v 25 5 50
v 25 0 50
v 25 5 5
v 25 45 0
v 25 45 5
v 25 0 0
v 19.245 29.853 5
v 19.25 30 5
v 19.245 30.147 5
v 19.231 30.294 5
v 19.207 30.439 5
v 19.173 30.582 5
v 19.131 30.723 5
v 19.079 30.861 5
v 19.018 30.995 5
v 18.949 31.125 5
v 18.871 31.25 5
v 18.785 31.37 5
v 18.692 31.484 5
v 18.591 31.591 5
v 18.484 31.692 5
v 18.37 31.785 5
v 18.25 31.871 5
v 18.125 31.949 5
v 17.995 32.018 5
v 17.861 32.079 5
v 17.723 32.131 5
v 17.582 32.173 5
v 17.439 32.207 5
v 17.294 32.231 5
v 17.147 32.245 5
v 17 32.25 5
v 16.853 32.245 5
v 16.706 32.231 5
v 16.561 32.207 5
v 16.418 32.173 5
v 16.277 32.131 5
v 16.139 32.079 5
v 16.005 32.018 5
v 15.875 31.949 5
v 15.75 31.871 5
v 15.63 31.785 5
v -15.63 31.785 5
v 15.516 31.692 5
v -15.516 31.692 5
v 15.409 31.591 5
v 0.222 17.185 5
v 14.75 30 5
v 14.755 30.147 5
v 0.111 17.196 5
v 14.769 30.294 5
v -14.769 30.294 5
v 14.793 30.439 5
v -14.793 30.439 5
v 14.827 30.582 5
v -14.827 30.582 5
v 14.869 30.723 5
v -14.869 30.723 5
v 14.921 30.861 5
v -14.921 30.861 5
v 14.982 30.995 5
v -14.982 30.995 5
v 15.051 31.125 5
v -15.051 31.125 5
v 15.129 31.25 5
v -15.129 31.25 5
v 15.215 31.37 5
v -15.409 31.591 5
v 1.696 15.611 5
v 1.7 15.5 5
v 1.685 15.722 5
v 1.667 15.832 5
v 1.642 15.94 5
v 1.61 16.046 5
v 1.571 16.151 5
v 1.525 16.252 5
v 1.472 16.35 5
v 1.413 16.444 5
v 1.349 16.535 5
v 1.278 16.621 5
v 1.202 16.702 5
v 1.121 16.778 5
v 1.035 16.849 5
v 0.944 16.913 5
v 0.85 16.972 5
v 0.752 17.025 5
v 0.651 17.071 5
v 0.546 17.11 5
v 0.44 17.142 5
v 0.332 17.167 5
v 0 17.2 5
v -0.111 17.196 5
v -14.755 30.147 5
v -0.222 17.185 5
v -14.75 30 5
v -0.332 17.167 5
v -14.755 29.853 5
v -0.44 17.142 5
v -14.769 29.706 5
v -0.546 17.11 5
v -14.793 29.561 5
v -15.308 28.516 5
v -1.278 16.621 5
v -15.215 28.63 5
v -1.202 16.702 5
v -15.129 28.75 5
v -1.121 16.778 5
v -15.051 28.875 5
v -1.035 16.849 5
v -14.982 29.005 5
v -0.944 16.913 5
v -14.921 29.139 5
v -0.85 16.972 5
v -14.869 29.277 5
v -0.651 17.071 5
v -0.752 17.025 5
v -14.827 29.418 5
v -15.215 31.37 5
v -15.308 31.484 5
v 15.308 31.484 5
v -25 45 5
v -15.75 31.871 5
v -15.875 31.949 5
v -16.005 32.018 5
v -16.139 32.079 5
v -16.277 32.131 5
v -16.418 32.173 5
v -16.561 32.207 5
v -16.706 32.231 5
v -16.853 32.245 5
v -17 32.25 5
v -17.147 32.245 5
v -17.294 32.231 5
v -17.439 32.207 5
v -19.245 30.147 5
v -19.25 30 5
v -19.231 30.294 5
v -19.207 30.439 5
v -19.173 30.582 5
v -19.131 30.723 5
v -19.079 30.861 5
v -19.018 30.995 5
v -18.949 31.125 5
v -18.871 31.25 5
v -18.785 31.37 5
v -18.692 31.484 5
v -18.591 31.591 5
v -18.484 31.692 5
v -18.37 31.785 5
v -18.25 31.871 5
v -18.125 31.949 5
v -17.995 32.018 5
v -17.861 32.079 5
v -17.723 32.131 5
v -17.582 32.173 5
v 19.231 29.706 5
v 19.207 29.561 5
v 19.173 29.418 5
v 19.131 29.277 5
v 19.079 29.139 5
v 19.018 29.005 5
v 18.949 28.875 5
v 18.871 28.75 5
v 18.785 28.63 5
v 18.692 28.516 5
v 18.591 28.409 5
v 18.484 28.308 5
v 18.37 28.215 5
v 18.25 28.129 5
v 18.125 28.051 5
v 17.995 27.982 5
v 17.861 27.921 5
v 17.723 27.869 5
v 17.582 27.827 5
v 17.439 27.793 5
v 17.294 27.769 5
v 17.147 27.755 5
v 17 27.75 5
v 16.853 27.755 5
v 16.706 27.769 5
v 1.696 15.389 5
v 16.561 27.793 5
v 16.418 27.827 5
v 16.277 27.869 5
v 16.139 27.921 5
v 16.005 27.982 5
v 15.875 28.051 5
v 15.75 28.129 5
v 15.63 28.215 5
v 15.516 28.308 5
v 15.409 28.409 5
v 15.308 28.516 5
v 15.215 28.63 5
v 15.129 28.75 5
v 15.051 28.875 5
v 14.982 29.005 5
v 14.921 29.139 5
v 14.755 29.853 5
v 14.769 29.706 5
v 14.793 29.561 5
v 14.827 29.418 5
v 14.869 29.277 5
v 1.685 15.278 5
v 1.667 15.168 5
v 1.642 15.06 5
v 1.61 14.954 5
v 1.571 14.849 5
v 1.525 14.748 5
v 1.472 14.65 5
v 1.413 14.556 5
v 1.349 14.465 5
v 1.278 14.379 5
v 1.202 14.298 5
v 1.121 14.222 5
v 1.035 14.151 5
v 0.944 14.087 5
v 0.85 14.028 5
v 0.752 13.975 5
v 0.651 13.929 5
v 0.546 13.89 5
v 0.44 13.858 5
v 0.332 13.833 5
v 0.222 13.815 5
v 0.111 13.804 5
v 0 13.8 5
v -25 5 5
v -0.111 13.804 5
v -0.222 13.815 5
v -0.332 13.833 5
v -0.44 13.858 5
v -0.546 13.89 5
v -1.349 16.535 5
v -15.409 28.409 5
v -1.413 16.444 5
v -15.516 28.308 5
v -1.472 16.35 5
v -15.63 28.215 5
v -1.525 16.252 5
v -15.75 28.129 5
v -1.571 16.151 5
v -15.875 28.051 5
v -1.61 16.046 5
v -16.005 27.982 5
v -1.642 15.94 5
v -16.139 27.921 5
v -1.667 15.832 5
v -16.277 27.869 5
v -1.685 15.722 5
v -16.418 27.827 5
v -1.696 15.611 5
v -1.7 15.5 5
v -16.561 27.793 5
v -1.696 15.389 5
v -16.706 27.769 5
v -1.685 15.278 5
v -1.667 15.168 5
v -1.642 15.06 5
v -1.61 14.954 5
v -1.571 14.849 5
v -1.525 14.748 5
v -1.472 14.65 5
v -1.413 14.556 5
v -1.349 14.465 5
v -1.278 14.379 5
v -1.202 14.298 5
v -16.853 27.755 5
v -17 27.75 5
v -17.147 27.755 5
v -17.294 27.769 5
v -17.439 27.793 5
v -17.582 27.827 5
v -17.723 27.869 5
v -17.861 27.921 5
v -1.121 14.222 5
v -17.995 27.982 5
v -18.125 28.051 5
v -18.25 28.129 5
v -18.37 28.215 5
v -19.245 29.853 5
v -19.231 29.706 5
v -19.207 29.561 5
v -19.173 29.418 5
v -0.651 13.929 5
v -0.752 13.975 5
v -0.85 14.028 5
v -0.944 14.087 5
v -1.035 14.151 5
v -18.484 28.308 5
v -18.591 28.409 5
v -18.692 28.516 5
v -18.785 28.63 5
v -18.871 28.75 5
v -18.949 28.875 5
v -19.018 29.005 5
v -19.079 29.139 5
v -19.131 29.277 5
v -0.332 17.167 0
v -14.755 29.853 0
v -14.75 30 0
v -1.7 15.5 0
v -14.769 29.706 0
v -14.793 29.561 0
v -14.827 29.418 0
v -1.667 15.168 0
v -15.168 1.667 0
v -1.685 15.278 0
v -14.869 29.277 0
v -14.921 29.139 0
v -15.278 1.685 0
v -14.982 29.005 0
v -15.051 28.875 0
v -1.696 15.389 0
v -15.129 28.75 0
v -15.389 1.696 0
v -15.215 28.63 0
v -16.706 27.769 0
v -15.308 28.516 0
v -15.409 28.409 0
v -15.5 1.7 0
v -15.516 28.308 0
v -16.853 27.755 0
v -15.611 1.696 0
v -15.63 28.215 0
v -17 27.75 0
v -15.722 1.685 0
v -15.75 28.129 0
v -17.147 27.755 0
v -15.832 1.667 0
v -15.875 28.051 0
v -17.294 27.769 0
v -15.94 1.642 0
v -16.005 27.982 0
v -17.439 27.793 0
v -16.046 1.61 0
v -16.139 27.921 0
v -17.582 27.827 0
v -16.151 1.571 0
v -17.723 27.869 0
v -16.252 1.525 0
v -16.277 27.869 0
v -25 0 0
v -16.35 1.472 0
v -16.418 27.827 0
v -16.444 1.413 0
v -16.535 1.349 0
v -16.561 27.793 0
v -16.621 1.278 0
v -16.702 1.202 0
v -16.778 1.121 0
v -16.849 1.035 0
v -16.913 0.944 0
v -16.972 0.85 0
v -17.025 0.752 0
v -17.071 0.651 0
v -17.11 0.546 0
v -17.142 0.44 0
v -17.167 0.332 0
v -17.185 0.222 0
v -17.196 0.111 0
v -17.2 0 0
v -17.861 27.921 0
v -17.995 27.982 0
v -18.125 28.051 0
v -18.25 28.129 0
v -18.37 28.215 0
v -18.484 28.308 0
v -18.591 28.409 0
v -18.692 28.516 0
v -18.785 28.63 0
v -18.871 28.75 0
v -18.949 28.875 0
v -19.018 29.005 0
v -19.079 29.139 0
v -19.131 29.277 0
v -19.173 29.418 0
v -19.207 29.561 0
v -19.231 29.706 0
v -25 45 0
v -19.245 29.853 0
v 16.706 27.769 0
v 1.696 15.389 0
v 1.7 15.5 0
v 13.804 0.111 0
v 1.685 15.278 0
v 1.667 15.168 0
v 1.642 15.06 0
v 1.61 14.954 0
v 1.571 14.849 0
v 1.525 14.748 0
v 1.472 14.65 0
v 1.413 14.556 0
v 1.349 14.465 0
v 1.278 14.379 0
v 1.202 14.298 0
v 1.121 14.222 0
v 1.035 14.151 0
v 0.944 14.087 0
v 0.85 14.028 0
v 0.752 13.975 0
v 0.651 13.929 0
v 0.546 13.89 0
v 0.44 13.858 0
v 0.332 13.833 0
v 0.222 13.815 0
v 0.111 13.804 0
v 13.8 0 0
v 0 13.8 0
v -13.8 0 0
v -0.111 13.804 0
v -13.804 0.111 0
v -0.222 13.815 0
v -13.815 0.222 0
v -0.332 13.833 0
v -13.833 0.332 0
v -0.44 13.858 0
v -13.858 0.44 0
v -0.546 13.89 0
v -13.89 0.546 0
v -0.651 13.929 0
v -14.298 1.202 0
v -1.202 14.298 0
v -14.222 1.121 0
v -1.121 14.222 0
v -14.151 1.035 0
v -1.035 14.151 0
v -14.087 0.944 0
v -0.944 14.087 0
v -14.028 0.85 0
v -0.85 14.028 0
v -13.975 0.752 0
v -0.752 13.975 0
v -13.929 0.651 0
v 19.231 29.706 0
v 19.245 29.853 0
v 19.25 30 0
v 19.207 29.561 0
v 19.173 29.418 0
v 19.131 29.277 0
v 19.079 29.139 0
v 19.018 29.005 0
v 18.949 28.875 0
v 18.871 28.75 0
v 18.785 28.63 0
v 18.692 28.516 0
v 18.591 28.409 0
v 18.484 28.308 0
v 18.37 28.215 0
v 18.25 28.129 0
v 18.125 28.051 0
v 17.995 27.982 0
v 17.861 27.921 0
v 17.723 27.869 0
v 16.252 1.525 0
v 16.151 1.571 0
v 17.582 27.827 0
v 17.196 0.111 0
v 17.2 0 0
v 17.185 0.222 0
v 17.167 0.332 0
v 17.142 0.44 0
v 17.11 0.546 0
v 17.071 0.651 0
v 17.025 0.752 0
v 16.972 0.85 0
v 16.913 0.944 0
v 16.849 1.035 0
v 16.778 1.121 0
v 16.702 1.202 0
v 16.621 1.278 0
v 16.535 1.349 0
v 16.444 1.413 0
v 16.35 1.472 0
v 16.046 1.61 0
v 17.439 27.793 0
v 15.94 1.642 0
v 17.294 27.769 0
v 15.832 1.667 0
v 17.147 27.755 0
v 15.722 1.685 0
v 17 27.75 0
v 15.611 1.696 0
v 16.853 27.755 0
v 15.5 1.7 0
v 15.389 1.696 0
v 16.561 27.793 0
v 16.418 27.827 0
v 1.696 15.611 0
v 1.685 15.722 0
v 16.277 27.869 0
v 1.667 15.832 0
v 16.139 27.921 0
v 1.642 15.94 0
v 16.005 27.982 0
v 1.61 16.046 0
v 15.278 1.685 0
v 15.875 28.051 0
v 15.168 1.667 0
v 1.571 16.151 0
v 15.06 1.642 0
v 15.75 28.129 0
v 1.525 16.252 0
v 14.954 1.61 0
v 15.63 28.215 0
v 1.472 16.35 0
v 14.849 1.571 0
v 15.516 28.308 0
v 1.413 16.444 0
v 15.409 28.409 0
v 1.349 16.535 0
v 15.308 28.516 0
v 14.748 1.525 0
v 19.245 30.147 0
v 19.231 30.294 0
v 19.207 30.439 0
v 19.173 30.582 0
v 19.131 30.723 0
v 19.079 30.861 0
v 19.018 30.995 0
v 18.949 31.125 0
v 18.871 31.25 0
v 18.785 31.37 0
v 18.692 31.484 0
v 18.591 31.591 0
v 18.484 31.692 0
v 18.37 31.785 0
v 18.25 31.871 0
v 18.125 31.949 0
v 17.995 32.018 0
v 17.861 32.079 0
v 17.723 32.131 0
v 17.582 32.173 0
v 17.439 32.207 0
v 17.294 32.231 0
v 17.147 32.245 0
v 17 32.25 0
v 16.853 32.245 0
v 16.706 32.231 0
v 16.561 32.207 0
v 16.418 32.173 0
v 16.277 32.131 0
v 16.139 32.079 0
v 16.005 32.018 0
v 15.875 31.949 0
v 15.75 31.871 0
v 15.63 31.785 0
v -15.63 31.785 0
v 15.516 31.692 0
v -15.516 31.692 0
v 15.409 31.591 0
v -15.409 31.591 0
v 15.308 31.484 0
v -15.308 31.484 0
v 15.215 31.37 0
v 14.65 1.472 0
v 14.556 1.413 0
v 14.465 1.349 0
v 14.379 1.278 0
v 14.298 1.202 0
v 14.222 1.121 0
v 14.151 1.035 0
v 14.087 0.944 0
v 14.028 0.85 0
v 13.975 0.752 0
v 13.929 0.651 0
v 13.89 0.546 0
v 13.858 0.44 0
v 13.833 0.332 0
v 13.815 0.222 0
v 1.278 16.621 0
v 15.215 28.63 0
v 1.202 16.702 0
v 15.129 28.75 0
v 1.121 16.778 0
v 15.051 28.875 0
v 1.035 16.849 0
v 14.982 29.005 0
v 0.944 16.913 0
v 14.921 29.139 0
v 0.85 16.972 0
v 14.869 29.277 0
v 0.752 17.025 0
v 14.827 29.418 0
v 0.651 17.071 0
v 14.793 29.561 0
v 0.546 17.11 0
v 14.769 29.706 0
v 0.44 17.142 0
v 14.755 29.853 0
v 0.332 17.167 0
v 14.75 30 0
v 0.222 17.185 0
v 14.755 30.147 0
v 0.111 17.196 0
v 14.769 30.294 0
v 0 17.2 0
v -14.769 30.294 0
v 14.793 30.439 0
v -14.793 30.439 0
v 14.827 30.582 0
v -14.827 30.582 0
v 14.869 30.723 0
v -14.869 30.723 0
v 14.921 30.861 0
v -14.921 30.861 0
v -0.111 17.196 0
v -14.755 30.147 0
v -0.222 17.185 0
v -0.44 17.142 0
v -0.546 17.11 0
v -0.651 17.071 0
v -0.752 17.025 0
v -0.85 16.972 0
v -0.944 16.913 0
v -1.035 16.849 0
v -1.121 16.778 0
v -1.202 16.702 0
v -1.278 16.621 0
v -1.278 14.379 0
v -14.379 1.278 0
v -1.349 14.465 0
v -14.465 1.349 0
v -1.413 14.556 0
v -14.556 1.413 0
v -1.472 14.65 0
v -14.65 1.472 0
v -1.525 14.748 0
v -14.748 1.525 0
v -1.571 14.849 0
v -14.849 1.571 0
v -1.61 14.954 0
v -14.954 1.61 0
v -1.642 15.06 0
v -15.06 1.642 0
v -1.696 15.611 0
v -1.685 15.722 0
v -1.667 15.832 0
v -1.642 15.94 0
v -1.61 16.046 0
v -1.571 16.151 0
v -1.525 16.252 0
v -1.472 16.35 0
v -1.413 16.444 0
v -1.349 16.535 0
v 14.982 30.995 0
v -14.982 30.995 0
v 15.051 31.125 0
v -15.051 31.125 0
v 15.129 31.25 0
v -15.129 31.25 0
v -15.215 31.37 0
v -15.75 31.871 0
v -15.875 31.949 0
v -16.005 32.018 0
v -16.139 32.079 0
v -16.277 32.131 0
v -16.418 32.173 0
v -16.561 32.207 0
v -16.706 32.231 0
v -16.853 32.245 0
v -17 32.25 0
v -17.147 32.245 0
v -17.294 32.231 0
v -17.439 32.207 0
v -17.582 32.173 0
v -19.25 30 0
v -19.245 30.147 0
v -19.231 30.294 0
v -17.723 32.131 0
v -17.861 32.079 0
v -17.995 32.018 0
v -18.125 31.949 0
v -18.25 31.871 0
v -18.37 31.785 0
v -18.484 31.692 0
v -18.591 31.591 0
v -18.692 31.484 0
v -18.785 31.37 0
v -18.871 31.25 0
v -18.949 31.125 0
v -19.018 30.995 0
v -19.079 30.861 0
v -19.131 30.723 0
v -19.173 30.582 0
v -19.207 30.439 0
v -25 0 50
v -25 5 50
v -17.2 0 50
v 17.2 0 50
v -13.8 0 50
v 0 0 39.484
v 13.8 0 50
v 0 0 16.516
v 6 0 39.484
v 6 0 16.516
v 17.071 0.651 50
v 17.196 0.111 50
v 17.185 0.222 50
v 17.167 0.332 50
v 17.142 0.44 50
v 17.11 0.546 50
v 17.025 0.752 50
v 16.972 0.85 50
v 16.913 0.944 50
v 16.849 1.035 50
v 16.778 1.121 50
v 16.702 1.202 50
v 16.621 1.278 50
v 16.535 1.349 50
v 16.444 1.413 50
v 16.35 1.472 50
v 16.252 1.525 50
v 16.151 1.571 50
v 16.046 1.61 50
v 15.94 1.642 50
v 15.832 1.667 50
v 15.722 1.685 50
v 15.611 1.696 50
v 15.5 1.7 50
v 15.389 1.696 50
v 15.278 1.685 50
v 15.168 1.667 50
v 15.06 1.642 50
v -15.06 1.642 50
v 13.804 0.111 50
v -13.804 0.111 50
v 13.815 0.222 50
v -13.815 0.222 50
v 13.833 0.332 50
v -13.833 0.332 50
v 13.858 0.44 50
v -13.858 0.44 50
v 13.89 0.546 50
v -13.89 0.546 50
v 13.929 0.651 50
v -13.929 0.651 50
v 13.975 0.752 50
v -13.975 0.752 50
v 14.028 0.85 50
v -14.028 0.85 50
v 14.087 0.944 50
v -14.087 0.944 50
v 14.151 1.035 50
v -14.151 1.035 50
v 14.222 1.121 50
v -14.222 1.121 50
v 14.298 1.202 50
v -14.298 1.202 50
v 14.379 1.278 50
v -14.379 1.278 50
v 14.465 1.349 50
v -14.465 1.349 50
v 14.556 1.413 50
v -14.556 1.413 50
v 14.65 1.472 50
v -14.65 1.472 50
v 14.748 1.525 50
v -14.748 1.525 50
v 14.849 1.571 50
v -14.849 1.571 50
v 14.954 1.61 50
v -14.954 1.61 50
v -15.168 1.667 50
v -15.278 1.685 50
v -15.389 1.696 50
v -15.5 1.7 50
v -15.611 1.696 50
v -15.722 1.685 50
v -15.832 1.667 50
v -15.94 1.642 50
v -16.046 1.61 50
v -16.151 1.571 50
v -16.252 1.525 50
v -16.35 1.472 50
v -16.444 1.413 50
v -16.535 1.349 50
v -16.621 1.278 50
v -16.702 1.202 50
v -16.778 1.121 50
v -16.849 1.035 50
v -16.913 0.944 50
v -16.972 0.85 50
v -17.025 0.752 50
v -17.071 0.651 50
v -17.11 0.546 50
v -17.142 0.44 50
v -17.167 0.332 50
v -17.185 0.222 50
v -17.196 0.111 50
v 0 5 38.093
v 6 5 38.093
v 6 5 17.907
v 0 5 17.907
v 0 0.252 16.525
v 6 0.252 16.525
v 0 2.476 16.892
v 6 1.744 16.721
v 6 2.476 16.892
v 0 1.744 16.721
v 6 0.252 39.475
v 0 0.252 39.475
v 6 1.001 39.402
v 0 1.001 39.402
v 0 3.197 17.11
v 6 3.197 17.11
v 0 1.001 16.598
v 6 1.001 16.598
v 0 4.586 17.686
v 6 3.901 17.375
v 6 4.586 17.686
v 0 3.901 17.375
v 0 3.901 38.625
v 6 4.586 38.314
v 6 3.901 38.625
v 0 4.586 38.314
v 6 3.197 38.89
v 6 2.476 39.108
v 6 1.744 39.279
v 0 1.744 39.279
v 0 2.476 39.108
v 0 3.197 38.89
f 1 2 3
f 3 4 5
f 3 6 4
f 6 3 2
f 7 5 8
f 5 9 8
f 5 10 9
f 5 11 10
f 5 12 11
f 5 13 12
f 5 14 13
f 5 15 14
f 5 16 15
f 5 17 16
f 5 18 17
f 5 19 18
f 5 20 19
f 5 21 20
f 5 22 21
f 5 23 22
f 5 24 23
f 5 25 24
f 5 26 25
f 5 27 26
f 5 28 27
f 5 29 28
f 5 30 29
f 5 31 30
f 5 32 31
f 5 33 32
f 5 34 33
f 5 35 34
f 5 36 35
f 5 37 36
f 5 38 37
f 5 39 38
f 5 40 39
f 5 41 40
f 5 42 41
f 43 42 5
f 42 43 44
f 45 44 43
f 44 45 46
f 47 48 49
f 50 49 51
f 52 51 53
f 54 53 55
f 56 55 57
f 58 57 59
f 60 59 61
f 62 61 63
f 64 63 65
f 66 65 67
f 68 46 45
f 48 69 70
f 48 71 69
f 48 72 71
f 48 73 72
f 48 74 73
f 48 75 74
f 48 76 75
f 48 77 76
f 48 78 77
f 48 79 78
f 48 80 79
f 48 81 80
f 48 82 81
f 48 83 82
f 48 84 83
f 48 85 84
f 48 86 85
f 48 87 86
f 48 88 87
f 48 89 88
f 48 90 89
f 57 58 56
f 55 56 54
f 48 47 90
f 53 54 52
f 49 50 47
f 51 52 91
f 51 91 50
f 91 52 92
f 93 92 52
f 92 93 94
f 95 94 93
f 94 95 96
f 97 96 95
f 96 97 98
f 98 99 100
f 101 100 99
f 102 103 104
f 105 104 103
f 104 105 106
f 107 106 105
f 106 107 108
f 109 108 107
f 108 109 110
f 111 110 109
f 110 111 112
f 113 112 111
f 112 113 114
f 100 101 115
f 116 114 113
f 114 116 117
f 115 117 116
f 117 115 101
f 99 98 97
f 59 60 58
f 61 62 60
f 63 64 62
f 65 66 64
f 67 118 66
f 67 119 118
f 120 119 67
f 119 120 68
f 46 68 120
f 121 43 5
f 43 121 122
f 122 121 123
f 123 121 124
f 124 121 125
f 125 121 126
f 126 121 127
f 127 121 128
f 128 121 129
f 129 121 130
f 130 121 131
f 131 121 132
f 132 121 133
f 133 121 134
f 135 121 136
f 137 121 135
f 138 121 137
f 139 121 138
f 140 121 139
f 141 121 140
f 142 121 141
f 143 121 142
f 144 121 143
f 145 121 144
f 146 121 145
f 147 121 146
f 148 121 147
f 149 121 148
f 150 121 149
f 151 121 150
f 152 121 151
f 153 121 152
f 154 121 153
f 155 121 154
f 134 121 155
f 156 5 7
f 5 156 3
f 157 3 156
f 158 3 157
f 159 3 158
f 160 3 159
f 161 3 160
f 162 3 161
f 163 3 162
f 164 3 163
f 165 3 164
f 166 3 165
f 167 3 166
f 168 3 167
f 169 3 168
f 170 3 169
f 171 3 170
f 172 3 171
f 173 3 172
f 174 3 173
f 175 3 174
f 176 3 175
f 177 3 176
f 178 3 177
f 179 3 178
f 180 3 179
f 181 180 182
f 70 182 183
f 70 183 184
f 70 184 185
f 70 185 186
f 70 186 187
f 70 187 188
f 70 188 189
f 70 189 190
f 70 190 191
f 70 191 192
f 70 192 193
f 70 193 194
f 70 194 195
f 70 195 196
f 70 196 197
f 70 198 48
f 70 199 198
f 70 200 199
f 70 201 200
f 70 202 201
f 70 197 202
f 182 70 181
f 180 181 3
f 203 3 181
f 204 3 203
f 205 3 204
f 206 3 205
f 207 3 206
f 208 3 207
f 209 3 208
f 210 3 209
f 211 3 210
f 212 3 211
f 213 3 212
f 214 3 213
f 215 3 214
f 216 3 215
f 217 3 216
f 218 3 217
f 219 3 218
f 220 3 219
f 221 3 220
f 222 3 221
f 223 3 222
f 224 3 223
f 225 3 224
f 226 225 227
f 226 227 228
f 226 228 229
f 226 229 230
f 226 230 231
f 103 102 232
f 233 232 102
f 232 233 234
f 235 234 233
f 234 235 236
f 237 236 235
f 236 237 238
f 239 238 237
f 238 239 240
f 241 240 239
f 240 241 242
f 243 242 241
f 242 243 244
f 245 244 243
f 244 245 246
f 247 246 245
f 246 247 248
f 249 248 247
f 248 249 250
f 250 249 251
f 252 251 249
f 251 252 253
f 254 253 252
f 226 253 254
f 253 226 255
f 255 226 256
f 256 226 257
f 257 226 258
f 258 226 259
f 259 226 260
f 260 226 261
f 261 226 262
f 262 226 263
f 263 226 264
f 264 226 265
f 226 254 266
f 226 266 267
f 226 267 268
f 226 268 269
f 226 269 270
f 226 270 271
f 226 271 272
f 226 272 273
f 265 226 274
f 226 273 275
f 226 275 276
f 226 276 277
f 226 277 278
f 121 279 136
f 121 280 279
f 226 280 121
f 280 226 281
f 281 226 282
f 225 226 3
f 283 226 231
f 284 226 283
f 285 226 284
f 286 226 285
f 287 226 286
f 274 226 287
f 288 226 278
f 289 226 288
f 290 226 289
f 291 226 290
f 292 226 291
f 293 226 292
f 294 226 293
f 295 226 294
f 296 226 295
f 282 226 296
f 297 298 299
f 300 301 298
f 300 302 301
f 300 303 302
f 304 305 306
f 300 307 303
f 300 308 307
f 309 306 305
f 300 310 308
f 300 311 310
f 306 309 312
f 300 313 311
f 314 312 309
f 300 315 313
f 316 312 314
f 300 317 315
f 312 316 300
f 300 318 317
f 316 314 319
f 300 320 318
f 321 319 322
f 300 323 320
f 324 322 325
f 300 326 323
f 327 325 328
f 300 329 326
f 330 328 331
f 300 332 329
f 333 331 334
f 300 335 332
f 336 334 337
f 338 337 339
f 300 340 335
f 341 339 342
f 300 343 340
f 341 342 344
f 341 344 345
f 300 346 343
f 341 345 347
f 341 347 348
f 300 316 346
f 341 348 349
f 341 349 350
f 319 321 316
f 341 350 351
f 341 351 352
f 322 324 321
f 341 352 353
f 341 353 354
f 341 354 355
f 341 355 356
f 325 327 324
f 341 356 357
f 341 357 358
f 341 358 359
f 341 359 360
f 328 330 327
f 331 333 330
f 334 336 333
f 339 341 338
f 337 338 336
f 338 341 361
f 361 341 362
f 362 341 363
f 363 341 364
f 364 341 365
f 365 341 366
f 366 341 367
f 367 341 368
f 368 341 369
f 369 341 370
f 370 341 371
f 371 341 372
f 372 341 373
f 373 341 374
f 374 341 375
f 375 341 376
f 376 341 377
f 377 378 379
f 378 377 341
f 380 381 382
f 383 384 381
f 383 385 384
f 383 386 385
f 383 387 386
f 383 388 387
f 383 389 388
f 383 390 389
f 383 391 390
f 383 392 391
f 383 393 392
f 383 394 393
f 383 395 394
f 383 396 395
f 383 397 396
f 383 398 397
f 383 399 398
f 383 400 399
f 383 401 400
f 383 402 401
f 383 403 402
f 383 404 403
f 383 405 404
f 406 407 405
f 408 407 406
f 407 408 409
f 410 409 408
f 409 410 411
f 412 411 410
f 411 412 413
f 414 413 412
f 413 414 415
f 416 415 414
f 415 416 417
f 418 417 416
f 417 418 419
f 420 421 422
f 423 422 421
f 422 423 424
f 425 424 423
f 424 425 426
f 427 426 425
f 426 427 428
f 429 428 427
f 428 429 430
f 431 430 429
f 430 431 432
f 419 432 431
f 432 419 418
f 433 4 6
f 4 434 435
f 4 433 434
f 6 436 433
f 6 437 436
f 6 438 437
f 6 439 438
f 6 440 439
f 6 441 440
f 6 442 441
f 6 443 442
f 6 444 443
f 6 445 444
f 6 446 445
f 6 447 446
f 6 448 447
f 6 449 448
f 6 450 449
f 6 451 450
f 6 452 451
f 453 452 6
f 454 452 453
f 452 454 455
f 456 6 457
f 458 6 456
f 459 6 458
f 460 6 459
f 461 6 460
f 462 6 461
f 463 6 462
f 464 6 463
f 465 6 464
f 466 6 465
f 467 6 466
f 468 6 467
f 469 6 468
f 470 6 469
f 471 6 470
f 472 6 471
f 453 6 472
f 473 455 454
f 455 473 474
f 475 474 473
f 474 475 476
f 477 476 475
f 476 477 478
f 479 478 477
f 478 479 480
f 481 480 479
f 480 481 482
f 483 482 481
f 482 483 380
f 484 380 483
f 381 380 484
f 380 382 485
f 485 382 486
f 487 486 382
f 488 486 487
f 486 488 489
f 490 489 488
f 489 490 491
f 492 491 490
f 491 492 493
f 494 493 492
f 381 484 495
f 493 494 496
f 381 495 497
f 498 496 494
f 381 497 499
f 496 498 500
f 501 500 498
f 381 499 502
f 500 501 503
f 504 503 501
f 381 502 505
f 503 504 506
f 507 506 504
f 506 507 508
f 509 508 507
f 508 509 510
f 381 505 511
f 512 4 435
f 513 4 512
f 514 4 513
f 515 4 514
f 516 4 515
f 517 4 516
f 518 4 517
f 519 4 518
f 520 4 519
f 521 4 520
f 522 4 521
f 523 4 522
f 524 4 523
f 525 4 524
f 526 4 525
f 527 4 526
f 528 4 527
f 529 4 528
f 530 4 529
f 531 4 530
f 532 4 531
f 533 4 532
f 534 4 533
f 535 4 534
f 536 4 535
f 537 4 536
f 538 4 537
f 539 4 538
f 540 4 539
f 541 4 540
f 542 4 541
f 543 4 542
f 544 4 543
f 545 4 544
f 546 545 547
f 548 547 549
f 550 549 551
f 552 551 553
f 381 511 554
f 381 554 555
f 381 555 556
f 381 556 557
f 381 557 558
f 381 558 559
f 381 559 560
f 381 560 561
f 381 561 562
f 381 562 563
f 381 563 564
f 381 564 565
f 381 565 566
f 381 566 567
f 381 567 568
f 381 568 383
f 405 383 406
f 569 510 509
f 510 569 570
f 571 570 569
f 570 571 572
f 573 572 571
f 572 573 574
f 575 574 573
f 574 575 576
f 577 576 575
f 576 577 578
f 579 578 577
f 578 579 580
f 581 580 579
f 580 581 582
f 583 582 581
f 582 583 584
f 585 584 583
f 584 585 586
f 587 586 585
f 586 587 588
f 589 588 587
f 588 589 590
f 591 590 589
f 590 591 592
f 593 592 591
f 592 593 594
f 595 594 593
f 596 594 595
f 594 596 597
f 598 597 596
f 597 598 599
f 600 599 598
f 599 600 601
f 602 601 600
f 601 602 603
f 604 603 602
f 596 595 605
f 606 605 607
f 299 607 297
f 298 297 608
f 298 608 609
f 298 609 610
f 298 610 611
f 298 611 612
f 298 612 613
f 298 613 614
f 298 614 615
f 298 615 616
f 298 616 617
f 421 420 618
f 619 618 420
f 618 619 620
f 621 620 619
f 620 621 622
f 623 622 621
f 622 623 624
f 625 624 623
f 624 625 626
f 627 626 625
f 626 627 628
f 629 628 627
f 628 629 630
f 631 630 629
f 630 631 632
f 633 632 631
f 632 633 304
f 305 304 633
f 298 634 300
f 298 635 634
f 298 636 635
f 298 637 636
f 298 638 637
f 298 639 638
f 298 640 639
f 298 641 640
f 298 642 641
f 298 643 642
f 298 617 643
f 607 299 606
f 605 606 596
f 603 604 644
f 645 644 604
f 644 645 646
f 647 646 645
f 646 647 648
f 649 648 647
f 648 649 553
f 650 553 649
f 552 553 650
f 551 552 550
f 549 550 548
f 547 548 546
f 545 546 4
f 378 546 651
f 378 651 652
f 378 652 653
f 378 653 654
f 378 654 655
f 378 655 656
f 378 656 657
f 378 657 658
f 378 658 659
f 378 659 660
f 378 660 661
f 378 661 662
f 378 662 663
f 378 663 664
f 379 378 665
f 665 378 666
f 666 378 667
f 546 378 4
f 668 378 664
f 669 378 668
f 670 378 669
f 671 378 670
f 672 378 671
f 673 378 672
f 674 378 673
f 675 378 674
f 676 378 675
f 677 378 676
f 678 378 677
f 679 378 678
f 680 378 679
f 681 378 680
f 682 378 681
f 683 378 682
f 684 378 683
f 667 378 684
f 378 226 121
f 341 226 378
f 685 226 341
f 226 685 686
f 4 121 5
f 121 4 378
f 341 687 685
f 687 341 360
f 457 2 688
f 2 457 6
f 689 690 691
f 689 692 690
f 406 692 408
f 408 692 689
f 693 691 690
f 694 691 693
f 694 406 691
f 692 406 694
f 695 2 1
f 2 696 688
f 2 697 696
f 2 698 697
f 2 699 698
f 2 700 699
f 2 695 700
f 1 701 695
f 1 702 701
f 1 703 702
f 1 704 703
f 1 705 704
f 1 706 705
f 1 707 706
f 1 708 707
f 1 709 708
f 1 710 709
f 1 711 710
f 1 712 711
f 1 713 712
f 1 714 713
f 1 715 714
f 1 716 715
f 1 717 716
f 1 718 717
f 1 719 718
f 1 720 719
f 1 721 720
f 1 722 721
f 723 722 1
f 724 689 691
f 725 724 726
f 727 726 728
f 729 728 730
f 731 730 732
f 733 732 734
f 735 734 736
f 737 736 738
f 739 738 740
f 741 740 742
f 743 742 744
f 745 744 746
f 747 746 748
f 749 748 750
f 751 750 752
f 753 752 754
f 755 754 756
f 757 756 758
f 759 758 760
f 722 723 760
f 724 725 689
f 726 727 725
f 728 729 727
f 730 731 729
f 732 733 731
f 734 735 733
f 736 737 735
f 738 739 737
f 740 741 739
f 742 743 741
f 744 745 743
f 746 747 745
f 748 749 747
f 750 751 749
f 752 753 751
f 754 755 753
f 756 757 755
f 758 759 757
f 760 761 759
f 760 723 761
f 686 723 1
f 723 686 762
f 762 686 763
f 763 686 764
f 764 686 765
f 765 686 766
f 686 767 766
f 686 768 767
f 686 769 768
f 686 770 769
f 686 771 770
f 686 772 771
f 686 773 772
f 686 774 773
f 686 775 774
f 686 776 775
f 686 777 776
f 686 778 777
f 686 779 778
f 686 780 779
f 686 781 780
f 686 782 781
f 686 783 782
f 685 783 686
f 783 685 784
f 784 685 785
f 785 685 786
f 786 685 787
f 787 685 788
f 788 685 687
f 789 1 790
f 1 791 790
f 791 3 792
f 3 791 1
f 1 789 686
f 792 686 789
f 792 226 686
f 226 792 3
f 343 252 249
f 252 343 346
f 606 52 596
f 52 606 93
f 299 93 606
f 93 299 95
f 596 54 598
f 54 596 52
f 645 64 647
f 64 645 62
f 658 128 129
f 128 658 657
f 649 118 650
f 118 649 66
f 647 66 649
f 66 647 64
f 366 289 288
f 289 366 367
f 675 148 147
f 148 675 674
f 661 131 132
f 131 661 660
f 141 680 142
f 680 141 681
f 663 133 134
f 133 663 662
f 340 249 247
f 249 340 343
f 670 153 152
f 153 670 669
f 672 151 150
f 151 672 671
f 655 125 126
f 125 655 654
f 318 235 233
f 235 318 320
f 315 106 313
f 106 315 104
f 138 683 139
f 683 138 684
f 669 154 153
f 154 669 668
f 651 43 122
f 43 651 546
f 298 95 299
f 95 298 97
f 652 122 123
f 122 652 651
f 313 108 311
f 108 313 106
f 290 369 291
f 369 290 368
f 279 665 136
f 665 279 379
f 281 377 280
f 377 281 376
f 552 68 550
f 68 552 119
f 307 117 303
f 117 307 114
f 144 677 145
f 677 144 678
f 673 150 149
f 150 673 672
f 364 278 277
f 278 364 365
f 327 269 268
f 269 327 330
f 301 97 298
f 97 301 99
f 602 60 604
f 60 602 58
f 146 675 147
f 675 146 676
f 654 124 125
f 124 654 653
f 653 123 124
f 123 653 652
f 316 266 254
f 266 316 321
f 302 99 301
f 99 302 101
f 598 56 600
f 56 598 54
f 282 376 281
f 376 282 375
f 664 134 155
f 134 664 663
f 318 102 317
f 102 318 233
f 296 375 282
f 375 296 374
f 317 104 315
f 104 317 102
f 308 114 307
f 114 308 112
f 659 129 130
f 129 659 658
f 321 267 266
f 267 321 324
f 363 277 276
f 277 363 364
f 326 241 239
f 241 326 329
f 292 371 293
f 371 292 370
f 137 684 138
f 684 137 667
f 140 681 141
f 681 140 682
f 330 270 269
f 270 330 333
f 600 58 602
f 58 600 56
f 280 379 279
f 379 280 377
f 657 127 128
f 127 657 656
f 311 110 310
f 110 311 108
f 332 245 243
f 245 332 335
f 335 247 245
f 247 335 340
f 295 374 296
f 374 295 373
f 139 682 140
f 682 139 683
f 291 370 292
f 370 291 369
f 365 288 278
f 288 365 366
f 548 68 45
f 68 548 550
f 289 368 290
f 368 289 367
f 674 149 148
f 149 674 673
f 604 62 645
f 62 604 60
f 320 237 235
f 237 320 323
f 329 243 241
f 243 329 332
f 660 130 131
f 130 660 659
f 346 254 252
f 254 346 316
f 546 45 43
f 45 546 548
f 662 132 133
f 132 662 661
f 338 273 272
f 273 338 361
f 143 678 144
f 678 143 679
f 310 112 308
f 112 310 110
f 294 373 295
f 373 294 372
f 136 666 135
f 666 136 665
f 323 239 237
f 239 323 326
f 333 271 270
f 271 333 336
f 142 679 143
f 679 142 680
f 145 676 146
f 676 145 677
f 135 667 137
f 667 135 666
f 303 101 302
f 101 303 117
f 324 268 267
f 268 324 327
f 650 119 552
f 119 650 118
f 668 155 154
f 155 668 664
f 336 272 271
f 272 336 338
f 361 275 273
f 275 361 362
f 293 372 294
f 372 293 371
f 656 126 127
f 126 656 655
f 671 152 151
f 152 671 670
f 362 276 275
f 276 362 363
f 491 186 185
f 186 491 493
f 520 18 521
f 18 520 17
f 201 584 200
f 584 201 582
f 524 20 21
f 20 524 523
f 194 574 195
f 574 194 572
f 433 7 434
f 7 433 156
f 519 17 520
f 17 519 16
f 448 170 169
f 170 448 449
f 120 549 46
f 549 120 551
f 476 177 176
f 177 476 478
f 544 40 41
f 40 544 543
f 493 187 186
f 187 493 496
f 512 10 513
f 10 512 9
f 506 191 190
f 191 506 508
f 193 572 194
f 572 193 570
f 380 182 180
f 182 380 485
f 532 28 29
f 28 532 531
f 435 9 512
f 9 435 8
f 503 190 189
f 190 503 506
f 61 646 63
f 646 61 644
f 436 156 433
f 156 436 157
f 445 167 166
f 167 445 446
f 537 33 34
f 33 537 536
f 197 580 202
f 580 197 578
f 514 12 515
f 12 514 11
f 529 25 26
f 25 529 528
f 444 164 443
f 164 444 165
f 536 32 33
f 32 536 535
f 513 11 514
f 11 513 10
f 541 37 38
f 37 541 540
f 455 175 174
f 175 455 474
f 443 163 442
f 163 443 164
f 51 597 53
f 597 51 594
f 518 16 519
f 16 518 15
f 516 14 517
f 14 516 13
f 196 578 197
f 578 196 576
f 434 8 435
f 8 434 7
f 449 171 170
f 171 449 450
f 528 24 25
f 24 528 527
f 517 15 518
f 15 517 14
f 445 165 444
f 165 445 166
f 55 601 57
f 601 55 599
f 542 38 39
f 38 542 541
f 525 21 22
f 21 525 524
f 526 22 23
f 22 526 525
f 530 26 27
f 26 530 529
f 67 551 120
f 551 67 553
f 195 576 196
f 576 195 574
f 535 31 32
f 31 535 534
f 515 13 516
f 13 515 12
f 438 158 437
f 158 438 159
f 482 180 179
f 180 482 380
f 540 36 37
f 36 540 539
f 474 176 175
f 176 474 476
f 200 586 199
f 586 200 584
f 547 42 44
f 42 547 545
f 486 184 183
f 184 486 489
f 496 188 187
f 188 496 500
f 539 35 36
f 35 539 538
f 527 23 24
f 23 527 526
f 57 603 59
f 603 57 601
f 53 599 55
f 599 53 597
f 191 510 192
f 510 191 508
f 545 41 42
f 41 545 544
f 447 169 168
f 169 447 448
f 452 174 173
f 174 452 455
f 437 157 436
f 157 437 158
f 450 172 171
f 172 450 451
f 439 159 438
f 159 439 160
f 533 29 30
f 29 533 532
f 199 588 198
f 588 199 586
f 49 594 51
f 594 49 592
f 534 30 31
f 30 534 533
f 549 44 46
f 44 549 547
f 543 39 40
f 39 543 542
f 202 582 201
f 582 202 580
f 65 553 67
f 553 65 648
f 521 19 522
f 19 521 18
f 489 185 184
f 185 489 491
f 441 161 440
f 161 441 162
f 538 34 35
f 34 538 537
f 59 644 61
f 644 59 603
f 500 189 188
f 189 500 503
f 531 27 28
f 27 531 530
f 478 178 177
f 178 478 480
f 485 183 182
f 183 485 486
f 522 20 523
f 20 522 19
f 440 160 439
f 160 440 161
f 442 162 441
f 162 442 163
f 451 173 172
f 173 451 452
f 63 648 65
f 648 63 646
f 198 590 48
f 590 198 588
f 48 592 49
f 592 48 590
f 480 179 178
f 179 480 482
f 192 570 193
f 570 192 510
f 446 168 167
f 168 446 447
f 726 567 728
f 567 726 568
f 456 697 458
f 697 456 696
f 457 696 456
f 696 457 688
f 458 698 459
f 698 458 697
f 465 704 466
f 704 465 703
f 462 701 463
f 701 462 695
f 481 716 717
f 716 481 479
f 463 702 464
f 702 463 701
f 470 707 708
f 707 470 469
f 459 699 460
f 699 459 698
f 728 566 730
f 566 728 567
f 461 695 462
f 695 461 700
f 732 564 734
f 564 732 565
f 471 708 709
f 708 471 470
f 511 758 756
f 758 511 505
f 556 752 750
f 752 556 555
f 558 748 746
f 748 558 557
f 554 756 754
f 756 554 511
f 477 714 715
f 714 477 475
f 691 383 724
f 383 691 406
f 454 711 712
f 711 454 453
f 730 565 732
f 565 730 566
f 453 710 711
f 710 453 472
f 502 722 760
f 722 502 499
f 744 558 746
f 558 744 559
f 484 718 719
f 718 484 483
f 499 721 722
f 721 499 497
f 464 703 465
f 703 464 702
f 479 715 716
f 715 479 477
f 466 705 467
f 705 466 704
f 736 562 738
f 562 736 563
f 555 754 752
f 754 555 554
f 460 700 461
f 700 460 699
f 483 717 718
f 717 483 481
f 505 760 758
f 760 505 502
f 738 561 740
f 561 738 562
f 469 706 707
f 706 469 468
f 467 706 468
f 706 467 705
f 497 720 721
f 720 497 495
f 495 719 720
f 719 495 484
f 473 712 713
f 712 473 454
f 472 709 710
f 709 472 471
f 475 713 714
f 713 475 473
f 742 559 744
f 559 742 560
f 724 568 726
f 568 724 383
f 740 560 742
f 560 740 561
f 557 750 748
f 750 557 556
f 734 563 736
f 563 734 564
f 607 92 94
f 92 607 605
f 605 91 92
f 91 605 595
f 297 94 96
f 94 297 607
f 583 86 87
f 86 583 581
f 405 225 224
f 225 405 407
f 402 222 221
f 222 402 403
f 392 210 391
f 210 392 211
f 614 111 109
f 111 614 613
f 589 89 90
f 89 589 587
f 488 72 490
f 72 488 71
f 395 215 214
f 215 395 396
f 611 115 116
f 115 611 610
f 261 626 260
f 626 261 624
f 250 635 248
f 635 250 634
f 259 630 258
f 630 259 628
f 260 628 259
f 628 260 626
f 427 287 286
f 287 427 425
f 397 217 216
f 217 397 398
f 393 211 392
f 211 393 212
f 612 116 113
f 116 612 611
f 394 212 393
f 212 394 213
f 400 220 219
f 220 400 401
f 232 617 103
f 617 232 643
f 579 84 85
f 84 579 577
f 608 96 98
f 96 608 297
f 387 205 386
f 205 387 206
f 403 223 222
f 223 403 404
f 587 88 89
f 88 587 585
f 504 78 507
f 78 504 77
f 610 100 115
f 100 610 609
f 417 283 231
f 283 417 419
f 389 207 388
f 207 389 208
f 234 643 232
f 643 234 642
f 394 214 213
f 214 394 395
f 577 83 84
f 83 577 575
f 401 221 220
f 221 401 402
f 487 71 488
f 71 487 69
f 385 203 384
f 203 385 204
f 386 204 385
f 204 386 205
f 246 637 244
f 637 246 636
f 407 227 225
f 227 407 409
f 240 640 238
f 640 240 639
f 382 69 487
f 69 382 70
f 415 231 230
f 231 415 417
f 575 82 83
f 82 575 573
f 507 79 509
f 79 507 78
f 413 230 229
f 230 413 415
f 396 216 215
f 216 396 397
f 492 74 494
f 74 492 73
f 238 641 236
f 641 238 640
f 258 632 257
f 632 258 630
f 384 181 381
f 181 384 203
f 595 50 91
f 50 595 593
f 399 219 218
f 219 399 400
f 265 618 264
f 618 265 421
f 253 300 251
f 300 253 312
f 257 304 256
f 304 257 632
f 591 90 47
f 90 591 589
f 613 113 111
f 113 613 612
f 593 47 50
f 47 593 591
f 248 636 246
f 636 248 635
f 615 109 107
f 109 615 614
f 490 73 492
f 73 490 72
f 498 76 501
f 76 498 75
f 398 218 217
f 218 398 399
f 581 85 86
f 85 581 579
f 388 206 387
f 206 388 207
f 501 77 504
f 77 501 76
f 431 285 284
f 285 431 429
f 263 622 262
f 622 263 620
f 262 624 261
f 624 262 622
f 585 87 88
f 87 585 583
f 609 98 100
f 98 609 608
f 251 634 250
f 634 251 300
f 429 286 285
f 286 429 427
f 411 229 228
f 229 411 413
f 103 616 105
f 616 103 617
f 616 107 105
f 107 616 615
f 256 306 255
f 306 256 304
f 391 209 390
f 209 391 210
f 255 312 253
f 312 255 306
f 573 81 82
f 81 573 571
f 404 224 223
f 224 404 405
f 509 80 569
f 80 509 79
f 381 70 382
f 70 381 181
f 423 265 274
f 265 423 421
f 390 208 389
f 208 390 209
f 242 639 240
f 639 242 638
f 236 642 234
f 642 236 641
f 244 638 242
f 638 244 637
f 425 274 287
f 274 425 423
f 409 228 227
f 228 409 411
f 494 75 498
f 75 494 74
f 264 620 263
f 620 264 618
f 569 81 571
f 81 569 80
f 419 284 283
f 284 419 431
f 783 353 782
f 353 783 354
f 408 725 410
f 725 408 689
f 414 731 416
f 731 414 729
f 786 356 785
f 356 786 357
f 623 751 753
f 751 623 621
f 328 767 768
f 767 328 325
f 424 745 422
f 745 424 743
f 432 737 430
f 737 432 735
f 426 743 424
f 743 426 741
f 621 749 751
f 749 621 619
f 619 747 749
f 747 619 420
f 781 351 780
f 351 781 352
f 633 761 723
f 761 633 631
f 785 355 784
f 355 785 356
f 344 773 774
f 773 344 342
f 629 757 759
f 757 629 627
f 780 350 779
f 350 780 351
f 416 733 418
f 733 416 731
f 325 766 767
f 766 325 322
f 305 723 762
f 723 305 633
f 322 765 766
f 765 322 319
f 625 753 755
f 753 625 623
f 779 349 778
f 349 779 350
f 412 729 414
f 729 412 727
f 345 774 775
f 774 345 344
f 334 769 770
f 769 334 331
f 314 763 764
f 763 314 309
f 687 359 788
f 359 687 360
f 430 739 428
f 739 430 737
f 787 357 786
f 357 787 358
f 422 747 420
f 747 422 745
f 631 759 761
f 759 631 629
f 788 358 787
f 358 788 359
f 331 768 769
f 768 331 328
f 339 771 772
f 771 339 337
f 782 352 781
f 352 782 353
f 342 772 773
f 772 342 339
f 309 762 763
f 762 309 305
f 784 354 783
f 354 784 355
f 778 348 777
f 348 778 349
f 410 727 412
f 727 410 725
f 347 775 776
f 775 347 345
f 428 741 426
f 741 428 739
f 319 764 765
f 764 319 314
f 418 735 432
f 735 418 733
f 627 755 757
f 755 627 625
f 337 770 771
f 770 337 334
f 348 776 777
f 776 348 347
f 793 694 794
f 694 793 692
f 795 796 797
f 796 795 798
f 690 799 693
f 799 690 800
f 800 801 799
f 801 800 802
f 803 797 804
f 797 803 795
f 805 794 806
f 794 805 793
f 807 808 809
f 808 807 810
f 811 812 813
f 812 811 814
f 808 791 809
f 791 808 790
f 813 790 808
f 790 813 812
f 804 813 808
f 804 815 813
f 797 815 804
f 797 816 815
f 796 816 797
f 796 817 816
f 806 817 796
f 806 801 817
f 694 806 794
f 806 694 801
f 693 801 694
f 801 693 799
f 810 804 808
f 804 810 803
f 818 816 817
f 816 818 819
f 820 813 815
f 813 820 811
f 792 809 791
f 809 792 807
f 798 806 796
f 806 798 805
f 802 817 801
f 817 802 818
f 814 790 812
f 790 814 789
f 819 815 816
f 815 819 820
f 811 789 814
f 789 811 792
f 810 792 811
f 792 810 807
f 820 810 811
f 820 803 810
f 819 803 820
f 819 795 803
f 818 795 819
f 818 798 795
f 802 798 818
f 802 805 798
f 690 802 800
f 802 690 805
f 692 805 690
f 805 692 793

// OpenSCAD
// L-shaped mounting bracket for NEMA 17 stepper motor
// Print orientation: base plate on bed (z = 0), vertical plate builds upward.

// ---------------- Parameters ----------------
base_x0      = -25;   // base plate x start
base_x1      = 25;    // base plate x end
base_y0      = 0;     // base plate y start
base_y1      = 45;    // base plate y end
base_z       = 5;     // base plate thickness

motor_x0     = -25;   // motor plate x start
motor_x1     = 25;    // motor plate x end
motor_y0     = 0;     // motor plate y start
motor_y1     = 5;     // motor plate y end (on back edge of base)
motor_z      = 50;    // motor plate height

hole_m4_x1   = -17;   // M4 through-hole x position 1
hole_m4_y1   = 30;    // M4 through-hole y position 1
hole_m4_x2   = 17;    // M4 through-hole x position 2
hole_m4_y2   = 30;    // M4 through-hole y position 2
hole_m4      = 4.5;   // M4 hole diameter

boss_d       = 23;    // motor centring boss hole diameter
boss_x       = 0;     // boss hole centre x
boss_z       = 28;    // boss hole centre z
screw_d      = 3.4;   // M3 screw hole diameter
screw_pitch  = 31;    // square pattern side length

gusset_t     = 5;     // gusset thickness (along X)
gusset_leg   = 20;    // right triangle leg length (Y and Z)
gusset_x0    = -25;   // left gusset x start
gusset_x1    = -20;   // left gusset x end
gusset_y0    = 5;     // gusset bottom y
gusset_z0    = 5;     // gusset side z

eps          = 0.5;   // cutter overshoot past faces

$fn = 96;

// ---------------- Model ----------------
difference() {
    union() {
        // Base plate
        translate([base_x0, base_y0, 0])
            cube([base_x1 - base_x0, base_y1 - base_y0, base_z]);

        // Vertical motor plate
        translate([motor_x0, motor_y0, 0])
            cube([motor_x1 - motor_x0, motor_y1 - motor_y0, motor_z]);

        // Left triangular gusset
        translate([gusset_x0, gusset_y0, gusset_z0])
            rotate([90, 0, 0])
                linear_extrude(height = gusset_t)
                    polygon([[0, 0], [gusset_leg, 0], [0, gusset_leg]]);

        // Right triangular gusset
        translate([gusset_x1, gusset_y0, gusset_z0])
            rotate([90, 0, 0])
                linear_extrude(height = gusset_t)
                    polygon([[0, 0], [gusset_leg, 0], [0, gusset_leg]]);
    }

    // M4 through-holes in base plate
    for (i = [1, 2])
        translate([i == 1 ? hole_m4_x1 : hole_m4_x2,
                   i == 1 ? hole_m4_y1 : hole_m4_y2,
                   -eps])
            cylinder(d = hole_m4, h = base_z + 2 * eps);

    // Motor boss hole (along Y)
    translate([boss_x, motor_y0 - eps, boss_z])
        rotate([0, 90, 0])
            cylinder(d = boss_d, h = motor_y1 - motor_y0 + 2 * eps);

    // M3 screw holes on square pattern centred on boss hole
    for (a = [0, 90, 180, 270])
        rotate([0, 0, a])
            translate([screw_pitch / 2, 0, 0])
                cylinder(d = screw_d, h = motor_z + eps);
}
